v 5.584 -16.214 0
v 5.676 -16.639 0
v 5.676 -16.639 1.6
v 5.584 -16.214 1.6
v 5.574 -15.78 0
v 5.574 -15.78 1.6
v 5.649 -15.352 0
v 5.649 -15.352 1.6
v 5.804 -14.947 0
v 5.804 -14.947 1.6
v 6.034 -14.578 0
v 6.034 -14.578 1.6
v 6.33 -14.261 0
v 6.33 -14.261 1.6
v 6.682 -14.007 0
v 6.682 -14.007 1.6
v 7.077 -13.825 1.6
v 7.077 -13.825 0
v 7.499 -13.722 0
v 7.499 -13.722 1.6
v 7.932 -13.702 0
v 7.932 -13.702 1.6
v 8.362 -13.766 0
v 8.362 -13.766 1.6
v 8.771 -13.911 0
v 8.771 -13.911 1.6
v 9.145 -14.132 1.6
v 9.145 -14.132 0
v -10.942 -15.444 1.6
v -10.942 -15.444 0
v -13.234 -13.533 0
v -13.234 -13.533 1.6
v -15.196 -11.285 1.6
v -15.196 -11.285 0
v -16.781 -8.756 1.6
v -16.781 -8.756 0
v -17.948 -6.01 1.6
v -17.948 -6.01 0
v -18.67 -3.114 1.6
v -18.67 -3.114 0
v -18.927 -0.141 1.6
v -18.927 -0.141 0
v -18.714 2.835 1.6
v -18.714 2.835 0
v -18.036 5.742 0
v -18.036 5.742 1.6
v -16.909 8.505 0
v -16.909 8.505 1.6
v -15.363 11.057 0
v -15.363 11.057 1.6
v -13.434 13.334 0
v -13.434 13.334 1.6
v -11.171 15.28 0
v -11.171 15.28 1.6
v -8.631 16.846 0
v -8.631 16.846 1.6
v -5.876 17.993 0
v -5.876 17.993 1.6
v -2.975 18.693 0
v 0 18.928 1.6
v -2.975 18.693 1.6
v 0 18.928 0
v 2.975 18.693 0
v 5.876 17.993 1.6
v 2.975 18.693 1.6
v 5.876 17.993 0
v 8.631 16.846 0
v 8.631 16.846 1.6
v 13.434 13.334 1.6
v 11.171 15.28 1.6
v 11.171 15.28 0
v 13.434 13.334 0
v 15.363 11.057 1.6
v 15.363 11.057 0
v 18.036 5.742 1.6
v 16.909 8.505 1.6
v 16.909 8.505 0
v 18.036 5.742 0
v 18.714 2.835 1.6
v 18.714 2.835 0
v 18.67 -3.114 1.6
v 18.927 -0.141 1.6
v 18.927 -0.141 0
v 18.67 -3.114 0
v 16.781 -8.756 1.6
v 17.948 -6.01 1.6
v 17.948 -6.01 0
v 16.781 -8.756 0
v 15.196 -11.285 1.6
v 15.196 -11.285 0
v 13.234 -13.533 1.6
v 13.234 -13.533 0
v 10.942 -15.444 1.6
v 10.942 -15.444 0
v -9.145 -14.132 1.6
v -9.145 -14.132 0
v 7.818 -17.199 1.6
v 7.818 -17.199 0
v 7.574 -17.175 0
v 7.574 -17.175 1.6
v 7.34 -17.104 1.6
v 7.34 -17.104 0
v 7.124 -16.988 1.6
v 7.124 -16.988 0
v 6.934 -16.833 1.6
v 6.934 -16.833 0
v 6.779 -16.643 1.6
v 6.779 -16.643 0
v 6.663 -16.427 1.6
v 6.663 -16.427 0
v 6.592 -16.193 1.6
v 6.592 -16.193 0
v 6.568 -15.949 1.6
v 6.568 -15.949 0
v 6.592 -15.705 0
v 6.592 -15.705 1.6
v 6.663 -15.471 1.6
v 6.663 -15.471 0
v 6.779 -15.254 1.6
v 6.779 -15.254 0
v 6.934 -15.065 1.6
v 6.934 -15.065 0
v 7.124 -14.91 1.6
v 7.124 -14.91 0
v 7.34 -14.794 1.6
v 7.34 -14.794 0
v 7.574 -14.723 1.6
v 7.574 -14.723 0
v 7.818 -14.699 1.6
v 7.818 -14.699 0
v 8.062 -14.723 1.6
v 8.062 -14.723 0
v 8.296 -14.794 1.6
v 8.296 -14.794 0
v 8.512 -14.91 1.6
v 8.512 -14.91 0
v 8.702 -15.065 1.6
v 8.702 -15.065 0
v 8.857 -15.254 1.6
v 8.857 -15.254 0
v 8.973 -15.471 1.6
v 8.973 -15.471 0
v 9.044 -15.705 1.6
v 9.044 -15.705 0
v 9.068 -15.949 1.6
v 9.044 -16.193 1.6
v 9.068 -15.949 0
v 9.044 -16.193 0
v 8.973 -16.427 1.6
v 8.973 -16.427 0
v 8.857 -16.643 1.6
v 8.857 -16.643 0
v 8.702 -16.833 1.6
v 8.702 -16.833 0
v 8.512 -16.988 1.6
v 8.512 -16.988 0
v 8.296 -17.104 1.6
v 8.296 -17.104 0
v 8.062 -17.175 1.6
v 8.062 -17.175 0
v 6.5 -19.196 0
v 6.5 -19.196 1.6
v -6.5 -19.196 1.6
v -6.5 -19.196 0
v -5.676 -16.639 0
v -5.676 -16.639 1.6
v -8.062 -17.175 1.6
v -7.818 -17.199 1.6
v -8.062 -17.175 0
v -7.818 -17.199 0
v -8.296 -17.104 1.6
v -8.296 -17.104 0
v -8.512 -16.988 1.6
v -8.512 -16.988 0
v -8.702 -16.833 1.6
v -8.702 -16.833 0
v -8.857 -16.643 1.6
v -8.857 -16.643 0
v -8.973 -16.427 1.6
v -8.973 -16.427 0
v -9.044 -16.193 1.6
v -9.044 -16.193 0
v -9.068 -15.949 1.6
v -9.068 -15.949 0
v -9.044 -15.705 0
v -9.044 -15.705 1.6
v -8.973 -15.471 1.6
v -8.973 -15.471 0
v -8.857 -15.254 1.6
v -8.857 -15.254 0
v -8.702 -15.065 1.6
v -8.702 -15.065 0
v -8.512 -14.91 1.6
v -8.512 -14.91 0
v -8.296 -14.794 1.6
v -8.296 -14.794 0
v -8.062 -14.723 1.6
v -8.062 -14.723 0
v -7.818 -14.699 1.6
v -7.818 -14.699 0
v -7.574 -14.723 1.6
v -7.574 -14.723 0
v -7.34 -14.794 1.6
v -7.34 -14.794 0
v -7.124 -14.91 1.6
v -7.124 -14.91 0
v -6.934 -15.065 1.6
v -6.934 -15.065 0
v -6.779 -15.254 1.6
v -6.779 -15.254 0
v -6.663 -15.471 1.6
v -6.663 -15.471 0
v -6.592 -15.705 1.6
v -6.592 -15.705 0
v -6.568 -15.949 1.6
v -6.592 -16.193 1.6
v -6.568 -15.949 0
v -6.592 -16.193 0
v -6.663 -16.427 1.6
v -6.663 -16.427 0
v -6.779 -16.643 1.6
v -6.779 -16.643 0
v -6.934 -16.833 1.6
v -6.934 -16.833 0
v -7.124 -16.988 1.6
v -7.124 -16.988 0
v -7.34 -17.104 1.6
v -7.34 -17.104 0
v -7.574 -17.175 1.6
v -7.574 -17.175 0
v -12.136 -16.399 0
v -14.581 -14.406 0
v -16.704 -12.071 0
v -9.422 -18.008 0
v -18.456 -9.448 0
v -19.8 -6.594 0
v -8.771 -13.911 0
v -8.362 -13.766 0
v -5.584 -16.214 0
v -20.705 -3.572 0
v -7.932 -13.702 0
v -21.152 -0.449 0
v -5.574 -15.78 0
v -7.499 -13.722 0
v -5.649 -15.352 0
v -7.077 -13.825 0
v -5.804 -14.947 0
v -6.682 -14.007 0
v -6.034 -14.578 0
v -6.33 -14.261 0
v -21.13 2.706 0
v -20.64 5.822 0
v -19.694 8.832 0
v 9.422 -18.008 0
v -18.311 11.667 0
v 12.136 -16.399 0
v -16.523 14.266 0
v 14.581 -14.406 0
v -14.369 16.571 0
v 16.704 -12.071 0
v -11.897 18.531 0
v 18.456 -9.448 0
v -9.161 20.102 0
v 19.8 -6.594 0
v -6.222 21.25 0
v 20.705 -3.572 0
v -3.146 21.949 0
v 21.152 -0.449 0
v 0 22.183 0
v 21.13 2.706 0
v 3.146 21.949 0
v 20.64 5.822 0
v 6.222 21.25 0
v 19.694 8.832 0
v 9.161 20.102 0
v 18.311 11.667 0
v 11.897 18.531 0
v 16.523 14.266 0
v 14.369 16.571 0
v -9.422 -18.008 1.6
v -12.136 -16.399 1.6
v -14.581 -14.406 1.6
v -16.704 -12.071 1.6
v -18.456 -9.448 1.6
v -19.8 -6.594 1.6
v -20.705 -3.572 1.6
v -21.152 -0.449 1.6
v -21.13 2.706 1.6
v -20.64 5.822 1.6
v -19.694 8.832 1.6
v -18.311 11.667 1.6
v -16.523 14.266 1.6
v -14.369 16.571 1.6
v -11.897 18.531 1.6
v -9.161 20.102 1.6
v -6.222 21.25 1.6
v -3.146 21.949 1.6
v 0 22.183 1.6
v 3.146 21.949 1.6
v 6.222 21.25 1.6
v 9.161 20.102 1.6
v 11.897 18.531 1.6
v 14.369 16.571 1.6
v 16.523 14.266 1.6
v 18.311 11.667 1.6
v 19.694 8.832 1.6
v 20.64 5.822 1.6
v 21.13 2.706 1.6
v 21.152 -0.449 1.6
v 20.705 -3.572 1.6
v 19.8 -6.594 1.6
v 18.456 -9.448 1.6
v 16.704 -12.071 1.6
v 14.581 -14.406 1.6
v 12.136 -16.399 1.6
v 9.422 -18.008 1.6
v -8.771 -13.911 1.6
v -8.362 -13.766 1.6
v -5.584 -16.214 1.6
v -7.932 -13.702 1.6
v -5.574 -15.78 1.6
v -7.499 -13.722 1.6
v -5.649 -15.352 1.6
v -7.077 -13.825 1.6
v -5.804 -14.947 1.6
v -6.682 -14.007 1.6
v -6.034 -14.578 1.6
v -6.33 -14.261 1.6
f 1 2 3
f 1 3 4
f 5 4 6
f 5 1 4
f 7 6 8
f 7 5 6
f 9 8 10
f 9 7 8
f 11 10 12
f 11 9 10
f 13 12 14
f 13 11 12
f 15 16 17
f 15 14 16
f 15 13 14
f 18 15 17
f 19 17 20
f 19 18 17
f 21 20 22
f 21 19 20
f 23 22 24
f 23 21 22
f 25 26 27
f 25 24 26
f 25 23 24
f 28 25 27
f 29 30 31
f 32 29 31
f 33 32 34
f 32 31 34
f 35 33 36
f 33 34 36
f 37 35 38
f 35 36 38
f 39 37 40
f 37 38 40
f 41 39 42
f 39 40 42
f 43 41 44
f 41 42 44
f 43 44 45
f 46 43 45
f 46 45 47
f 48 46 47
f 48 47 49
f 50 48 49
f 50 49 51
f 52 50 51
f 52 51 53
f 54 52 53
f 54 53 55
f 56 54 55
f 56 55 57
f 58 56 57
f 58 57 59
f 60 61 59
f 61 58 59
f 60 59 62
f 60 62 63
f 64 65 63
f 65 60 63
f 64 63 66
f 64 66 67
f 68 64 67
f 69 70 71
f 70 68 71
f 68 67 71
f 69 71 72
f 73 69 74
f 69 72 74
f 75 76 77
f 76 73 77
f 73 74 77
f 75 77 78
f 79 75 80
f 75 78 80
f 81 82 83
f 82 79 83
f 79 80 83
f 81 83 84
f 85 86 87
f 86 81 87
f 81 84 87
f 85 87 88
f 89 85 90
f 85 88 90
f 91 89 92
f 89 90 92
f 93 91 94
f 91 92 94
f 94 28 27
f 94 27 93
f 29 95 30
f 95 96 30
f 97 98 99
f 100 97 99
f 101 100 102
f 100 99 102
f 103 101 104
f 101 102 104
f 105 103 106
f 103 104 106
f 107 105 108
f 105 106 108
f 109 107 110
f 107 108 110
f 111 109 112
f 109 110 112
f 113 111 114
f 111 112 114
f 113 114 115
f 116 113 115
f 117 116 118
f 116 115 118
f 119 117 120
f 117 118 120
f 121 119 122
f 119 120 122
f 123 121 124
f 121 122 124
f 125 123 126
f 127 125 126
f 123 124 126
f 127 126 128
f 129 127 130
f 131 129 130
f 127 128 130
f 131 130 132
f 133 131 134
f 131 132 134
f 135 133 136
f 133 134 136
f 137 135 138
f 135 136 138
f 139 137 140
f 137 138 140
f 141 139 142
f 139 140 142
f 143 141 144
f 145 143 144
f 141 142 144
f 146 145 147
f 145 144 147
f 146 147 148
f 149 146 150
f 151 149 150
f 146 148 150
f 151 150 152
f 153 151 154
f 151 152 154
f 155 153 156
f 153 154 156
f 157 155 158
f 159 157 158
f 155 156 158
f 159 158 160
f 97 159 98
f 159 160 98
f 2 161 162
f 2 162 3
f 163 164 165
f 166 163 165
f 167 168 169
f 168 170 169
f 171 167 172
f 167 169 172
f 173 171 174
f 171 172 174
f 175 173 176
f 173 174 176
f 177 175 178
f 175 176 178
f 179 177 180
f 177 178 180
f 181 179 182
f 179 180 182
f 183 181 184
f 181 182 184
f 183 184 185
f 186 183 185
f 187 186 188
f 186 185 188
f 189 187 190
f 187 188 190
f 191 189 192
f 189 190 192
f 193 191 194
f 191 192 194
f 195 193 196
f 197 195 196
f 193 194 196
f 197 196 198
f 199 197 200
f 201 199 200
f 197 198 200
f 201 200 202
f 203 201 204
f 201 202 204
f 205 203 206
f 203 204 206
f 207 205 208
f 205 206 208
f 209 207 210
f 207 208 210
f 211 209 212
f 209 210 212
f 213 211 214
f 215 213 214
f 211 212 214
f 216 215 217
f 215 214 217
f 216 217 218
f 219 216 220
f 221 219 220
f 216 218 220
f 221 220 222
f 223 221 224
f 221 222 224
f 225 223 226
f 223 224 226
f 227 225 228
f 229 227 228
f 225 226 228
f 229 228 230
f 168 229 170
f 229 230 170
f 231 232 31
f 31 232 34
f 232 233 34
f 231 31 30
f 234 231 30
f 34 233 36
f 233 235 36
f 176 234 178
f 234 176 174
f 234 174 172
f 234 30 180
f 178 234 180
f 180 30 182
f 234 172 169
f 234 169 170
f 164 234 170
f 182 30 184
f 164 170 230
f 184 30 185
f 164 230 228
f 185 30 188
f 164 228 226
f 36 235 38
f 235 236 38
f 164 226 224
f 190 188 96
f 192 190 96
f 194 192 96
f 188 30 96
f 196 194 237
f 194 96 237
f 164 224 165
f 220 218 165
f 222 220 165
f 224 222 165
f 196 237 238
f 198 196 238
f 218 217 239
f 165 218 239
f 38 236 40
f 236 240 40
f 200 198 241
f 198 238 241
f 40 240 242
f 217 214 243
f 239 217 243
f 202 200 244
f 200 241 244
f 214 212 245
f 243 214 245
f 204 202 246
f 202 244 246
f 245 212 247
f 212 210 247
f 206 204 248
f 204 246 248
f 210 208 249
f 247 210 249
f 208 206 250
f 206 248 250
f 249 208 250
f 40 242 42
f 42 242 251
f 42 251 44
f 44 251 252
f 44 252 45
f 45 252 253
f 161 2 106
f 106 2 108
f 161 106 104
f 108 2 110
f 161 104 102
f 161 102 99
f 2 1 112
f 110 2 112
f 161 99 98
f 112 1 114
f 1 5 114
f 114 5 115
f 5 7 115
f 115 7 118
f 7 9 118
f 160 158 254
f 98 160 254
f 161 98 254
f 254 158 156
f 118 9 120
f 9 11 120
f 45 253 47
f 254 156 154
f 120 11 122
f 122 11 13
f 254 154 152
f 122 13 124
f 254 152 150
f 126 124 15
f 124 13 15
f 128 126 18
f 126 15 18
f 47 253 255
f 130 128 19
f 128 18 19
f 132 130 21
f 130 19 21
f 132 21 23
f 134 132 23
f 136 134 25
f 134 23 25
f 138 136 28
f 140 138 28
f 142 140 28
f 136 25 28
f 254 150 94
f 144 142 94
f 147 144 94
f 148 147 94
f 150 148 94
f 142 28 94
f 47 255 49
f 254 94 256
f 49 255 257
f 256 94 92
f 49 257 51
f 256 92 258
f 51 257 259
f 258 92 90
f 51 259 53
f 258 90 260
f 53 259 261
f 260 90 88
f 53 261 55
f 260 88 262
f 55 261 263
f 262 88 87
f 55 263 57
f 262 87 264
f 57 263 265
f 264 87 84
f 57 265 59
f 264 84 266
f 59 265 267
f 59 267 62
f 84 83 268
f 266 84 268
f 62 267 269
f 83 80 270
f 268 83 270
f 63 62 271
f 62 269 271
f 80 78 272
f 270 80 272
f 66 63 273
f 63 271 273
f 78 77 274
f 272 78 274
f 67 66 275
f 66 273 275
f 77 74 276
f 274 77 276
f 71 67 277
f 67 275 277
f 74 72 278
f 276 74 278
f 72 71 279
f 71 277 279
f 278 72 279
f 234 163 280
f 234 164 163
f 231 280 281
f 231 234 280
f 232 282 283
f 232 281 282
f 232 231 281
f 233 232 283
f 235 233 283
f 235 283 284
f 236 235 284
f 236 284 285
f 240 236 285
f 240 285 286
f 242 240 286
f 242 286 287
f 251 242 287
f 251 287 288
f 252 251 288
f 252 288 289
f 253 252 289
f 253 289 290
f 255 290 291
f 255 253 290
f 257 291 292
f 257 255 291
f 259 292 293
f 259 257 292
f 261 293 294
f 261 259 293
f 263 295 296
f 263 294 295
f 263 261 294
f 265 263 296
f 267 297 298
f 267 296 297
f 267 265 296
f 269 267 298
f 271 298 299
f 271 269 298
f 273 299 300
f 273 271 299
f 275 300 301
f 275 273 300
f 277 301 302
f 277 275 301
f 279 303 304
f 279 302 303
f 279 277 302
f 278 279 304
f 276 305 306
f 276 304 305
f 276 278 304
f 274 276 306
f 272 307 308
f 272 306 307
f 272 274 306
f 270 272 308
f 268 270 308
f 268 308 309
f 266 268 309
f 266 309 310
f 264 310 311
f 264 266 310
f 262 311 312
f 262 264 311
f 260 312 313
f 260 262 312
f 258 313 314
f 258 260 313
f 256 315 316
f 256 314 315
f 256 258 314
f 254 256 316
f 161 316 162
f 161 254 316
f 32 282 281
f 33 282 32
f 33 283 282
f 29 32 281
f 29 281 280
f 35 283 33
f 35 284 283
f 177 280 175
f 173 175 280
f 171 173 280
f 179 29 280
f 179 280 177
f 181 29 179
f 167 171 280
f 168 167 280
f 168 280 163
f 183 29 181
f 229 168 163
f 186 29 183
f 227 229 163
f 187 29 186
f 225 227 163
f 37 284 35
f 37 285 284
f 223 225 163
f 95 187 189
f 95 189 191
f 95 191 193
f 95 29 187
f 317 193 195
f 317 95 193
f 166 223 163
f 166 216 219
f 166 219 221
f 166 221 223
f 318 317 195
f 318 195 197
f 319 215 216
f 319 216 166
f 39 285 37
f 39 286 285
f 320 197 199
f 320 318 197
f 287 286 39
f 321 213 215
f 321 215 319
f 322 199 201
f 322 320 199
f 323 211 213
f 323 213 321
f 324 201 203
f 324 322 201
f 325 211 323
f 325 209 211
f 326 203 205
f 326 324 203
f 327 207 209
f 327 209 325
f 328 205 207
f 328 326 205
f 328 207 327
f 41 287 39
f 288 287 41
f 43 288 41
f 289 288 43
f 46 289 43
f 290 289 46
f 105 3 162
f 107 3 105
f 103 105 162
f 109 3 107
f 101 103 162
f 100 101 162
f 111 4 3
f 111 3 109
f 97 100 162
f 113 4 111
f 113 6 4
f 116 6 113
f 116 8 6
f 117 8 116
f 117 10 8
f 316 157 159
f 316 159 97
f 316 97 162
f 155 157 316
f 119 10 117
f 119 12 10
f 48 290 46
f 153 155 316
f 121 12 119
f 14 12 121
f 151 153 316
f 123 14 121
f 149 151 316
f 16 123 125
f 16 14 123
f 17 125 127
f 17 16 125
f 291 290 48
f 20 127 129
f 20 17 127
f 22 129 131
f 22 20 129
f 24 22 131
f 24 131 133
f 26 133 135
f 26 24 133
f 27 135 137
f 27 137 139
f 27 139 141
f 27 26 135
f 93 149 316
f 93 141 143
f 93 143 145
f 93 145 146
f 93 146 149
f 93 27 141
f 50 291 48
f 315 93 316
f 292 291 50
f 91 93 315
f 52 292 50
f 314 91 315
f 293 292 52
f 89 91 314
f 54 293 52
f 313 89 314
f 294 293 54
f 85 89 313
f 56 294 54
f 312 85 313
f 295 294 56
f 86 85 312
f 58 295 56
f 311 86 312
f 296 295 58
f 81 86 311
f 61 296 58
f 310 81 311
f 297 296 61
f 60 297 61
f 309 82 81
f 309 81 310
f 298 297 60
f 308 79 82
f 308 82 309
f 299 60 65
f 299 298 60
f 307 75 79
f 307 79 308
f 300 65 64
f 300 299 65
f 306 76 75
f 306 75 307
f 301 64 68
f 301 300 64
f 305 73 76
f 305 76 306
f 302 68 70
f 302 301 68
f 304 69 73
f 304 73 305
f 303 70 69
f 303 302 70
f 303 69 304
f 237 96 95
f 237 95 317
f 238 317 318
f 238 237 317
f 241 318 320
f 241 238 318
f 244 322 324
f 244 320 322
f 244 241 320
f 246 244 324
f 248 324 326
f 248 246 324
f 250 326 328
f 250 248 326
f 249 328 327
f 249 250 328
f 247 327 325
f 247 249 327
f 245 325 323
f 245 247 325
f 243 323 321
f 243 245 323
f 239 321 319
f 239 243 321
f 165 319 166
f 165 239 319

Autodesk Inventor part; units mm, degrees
ref_plane "WorkPlane1" through (0, 0, 0) normal (0, 0, 1) x (1, 0, 0)
ref_plane "Work Plane2" through (0, 0, -1.6) normal (0, 0, 1) x (1, 0, 0)
ref_plane "WorkPlane2" through (0, 0, 1) normal (0, 0, 1) x (1, 0, 0)
sketch "Sketch1" plane through (0, 0, 0) normal (0, 0, 1) x (1, 0, 0)
  point P0 (0, 0)
sketch "Sketch2" plane through (0, 0, 0) normal (0, 0, 1) x (1, 0, 0)
  line L0 (6.5, -19.1956) -> (5.6764, -16.6388)
  arc A0 (9.1452, -14.132) -> (5.6764, -16.6388) centre (7.818, -15.9489) ccw
  line L1 (9.1452, -14.132) -> (10.9421, -15.4445)
  arc A1 (10.9421, -15.4445) -> (-10.9421, -15.4445) centre (0, 0) ccw
  line L2 (-9.1452, -14.132) -> (-10.9421, -15.4445)
  arc A2 (-5.6764, -16.6388) -> (-9.1452, -14.132) centre (-7.818, -15.9489) ccw
  line L3 (-6.5, -19.1956) -> (-5.6764, -16.6388)
  arc A3 (6.5, -19.1956) -> (-6.5, -19.1956) centre (0, 0.9833) ccw
  line L4 (0, 0.9833) -> (-6.5, -19.1956) construction
  line L5 (0, 0.9833) -> (6.5, -19.1956) construction
  dimension "d2" = 21.2
  dimension "d4" = 0
  dimension "d6" = 18.9278
  dimension "d8" = 0.9833
  dimension "d10" = 6.5
  dimension "d12" = 6.5
  dimension "d14" = 2.25
  dimension "d16" = 2.25
  dimension "d18" = 18.65
  dimension "d20" = 18.65
  dimension "d22" = 36
  dimension "d24" = 36
extrude "Extrusion1" add sketch "Sketch2" along normal blind 1.6
sketch "Sketch3" plane through (0, 0, 1.6) normal (0, 0, 1) x (1, 0, 0)
  arc A0 (-5.6764, -16.6388) -> (-9.1452, -14.132) centre (-7.818, -15.9489) ccw projected
hole "Hole1" at (-7.818, -15.9489, 1.6) direction (0, 0, -1) diameter 2.5 end through all
sketch "Sketch4" plane through (0, 0, 1.6) normal (0, 0, 1) x (1, 0, 0)
  arc A0 (9.1452, -14.132) -> (5.6764, -16.6388) centre (7.818, -15.9489) ccw projected
hole "Hole2" at (7.818, -15.9489, 1.6) direction (0, 0, -1) diameter 2.5 end through all
equation "\"d29\" = Diam5"
equation "\"d36\" = Diam5"
equation "\"d2\" = 0.5 * Diam2"
equation "\"d6\" = 0.5 * msp_dd1"
equation "\"d8\" = -0.5 * msp_dd1 + 0.5 * Diam2 - 0.222222 * ParA"
equation "\"d10\" = 2.6 * Diam5"
equation "\"d12\" = 2.6 * Diam5"
equation "\"d14\" = 0.9 * Diam5"
equation "\"d16\" = 0.9 * Diam5"
equation "\"d18\" = 1.3 * Diam5 + 0.5 * Diam2 - ParA"
equation "\"d20\" = 1.3 * Diam5 + 0.5 * Diam2 - ParA"
equation "\"d25\" = ParS"
equation "\"Diam5\" = 2.5"
equation "\"ParA\" = 5.8"
equation "\"ParS\" = 1.6"
equation "\"Diam2\" = 42.4"
equation "\"msp_dd1\" = -b + Diam2 - 0.111111 * ParA"
equation "\"msp_pom\" = 0.5 * Diam2 - b"
equation "\"TEMPLATE\" = 1.2345"
properties part number "Кольцо стопорное внутреннее" material "Steel, Mild"
